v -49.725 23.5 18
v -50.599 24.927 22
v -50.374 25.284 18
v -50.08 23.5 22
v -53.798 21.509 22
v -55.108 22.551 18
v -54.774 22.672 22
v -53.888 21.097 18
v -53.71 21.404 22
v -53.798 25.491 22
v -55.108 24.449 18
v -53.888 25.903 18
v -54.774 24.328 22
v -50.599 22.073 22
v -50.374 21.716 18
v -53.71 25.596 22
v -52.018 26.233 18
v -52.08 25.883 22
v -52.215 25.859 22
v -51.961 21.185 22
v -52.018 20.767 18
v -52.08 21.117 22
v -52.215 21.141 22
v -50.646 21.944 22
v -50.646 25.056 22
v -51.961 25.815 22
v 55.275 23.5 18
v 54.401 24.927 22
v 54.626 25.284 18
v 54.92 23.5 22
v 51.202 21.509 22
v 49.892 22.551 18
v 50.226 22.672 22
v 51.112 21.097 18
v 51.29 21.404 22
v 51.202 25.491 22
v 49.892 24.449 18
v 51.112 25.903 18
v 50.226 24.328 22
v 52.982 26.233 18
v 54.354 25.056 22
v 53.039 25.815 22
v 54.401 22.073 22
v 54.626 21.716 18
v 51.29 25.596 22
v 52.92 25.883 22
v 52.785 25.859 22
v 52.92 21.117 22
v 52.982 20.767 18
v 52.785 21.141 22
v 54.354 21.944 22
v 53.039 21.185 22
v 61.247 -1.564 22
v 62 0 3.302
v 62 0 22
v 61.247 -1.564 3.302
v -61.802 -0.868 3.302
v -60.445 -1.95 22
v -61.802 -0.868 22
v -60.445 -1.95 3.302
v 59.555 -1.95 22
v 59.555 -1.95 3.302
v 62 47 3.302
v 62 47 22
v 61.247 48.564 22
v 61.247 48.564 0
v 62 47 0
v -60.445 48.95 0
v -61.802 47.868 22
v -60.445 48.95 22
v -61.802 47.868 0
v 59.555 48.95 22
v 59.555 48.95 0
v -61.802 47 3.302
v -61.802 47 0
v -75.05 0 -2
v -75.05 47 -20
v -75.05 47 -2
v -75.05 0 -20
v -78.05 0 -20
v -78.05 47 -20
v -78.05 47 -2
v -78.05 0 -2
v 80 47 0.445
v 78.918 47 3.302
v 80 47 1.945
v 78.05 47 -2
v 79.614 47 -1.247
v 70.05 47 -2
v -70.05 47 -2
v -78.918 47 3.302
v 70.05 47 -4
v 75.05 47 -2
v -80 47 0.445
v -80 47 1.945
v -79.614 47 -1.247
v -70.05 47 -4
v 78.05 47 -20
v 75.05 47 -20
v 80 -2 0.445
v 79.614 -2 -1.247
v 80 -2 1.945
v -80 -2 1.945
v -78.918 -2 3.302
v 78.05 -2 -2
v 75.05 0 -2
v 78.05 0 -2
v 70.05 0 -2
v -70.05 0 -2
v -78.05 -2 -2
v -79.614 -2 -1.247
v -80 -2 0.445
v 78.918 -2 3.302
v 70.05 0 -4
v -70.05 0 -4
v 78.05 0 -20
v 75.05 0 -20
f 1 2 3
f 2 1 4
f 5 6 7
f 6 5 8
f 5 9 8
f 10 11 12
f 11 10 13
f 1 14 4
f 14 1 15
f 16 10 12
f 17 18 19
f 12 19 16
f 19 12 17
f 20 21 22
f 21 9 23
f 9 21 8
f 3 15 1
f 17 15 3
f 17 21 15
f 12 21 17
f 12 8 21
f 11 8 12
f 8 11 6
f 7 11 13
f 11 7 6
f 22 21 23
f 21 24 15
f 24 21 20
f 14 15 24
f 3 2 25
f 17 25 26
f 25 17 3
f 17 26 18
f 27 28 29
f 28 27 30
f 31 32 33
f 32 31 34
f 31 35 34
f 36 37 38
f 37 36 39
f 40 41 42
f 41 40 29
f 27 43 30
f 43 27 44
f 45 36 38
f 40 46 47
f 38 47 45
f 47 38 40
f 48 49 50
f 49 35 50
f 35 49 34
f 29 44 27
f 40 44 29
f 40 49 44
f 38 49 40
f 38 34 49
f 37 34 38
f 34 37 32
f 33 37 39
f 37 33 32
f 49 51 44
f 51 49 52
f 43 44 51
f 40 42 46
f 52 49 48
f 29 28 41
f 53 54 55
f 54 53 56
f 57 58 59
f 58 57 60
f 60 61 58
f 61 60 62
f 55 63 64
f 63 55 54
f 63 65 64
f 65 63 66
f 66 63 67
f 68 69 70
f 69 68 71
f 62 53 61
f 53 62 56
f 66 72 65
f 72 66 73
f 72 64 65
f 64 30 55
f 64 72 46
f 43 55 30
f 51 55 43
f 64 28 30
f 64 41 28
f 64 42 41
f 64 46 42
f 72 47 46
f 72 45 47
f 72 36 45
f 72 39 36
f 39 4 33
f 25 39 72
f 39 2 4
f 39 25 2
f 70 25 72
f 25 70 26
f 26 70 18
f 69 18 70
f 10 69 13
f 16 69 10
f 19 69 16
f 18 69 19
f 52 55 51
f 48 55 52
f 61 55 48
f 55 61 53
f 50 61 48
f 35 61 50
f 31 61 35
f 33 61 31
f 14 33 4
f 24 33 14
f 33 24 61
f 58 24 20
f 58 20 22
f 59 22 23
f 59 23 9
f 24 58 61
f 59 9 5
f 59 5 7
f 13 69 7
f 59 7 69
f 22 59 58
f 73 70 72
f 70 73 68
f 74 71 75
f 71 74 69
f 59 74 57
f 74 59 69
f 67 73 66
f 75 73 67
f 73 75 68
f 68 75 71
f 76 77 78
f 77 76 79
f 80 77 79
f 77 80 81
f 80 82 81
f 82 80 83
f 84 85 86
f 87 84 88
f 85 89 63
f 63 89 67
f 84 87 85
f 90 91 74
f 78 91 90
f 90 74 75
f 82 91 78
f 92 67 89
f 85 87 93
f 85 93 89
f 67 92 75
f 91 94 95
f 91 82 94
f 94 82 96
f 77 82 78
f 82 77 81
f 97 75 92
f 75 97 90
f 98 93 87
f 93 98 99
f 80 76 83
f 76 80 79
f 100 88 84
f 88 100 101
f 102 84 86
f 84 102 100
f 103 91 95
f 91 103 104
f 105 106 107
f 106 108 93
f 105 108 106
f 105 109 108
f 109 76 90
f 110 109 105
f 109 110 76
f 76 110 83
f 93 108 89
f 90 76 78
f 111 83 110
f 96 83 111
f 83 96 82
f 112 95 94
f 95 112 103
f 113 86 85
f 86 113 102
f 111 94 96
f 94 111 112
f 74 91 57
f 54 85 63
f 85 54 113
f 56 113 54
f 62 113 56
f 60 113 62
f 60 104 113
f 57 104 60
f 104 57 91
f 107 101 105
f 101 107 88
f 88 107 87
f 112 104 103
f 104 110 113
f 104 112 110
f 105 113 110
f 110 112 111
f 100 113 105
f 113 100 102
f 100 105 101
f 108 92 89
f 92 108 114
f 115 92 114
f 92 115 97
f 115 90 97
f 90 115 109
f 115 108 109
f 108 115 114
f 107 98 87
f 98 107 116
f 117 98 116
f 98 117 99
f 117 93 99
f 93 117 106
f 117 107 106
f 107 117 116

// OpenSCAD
// we want something that can sit across the
// 5.25" bay holders and support the XTOP's
// mounts, designed to mate to a 120mm fan.
// 5.25" bay is 146.1mm wide
w = 146.1;

// we want to look like a 120mm fan
iw = 120;
hw = 105; // screw hole centers are 105mm apart

// the mounts are 26mm
m = 47;

// we need a 16mm tall core to match the height
// of the other mount, sitting atop two fans and
// a radiator. on the outside, though, we don't
// want it so thicc, in case there's another
// device in the next bay up
h = 20;

// brace we're topping is 1.5mm wide. give it
// an extra half mm.
i = 2;

// 5.55mm diameter screws
sw = 5.55 / 2;

// the wings on the sides hold us onto the
// braces. if they're too thin, they'll break off.
ww = 3;

translate([-w/2, 0, 0]){
    // left wing
    translate([-(i + ww), 0, -h]){
        cube([ww, m, h]);
    }
    // upper support (what the pump mates)
    translate([(w - iw) / 2, 0, 0]){
        
        difference(){
            minkowski(){
                cube([iw, m, h]);
                cylinder(r = 2, h = 2);
            }
            union(){
                translate([(iw - hw) / 2, m / 2, h - 2]){
                    cylinder(h, sw, true);
                }
                translate([(iw - hw) / 2 + hw, m / 2, h - 2]){
                    cylinder(h, sw, true);
                }
            }
        }
    }
    // common layer
    translate([-(i + ww), 0, 0]){
        minkowski(){
            cube([w + i * 2 + ww * 2, m, 1.5]);
            rotate([90, 90, 0]){
                cylinder(r = 2, h = 2);
            }
        }
    }
    // middle piece to wedge us atop bay mounts
    translate([i + 1, 0, -4]){
        cube([w - i * 2 - 2, m, 4]);
    }
    // right wing
    translate([w + i, 0, -h]){
        cube([ww, m, h]);
    }
}
